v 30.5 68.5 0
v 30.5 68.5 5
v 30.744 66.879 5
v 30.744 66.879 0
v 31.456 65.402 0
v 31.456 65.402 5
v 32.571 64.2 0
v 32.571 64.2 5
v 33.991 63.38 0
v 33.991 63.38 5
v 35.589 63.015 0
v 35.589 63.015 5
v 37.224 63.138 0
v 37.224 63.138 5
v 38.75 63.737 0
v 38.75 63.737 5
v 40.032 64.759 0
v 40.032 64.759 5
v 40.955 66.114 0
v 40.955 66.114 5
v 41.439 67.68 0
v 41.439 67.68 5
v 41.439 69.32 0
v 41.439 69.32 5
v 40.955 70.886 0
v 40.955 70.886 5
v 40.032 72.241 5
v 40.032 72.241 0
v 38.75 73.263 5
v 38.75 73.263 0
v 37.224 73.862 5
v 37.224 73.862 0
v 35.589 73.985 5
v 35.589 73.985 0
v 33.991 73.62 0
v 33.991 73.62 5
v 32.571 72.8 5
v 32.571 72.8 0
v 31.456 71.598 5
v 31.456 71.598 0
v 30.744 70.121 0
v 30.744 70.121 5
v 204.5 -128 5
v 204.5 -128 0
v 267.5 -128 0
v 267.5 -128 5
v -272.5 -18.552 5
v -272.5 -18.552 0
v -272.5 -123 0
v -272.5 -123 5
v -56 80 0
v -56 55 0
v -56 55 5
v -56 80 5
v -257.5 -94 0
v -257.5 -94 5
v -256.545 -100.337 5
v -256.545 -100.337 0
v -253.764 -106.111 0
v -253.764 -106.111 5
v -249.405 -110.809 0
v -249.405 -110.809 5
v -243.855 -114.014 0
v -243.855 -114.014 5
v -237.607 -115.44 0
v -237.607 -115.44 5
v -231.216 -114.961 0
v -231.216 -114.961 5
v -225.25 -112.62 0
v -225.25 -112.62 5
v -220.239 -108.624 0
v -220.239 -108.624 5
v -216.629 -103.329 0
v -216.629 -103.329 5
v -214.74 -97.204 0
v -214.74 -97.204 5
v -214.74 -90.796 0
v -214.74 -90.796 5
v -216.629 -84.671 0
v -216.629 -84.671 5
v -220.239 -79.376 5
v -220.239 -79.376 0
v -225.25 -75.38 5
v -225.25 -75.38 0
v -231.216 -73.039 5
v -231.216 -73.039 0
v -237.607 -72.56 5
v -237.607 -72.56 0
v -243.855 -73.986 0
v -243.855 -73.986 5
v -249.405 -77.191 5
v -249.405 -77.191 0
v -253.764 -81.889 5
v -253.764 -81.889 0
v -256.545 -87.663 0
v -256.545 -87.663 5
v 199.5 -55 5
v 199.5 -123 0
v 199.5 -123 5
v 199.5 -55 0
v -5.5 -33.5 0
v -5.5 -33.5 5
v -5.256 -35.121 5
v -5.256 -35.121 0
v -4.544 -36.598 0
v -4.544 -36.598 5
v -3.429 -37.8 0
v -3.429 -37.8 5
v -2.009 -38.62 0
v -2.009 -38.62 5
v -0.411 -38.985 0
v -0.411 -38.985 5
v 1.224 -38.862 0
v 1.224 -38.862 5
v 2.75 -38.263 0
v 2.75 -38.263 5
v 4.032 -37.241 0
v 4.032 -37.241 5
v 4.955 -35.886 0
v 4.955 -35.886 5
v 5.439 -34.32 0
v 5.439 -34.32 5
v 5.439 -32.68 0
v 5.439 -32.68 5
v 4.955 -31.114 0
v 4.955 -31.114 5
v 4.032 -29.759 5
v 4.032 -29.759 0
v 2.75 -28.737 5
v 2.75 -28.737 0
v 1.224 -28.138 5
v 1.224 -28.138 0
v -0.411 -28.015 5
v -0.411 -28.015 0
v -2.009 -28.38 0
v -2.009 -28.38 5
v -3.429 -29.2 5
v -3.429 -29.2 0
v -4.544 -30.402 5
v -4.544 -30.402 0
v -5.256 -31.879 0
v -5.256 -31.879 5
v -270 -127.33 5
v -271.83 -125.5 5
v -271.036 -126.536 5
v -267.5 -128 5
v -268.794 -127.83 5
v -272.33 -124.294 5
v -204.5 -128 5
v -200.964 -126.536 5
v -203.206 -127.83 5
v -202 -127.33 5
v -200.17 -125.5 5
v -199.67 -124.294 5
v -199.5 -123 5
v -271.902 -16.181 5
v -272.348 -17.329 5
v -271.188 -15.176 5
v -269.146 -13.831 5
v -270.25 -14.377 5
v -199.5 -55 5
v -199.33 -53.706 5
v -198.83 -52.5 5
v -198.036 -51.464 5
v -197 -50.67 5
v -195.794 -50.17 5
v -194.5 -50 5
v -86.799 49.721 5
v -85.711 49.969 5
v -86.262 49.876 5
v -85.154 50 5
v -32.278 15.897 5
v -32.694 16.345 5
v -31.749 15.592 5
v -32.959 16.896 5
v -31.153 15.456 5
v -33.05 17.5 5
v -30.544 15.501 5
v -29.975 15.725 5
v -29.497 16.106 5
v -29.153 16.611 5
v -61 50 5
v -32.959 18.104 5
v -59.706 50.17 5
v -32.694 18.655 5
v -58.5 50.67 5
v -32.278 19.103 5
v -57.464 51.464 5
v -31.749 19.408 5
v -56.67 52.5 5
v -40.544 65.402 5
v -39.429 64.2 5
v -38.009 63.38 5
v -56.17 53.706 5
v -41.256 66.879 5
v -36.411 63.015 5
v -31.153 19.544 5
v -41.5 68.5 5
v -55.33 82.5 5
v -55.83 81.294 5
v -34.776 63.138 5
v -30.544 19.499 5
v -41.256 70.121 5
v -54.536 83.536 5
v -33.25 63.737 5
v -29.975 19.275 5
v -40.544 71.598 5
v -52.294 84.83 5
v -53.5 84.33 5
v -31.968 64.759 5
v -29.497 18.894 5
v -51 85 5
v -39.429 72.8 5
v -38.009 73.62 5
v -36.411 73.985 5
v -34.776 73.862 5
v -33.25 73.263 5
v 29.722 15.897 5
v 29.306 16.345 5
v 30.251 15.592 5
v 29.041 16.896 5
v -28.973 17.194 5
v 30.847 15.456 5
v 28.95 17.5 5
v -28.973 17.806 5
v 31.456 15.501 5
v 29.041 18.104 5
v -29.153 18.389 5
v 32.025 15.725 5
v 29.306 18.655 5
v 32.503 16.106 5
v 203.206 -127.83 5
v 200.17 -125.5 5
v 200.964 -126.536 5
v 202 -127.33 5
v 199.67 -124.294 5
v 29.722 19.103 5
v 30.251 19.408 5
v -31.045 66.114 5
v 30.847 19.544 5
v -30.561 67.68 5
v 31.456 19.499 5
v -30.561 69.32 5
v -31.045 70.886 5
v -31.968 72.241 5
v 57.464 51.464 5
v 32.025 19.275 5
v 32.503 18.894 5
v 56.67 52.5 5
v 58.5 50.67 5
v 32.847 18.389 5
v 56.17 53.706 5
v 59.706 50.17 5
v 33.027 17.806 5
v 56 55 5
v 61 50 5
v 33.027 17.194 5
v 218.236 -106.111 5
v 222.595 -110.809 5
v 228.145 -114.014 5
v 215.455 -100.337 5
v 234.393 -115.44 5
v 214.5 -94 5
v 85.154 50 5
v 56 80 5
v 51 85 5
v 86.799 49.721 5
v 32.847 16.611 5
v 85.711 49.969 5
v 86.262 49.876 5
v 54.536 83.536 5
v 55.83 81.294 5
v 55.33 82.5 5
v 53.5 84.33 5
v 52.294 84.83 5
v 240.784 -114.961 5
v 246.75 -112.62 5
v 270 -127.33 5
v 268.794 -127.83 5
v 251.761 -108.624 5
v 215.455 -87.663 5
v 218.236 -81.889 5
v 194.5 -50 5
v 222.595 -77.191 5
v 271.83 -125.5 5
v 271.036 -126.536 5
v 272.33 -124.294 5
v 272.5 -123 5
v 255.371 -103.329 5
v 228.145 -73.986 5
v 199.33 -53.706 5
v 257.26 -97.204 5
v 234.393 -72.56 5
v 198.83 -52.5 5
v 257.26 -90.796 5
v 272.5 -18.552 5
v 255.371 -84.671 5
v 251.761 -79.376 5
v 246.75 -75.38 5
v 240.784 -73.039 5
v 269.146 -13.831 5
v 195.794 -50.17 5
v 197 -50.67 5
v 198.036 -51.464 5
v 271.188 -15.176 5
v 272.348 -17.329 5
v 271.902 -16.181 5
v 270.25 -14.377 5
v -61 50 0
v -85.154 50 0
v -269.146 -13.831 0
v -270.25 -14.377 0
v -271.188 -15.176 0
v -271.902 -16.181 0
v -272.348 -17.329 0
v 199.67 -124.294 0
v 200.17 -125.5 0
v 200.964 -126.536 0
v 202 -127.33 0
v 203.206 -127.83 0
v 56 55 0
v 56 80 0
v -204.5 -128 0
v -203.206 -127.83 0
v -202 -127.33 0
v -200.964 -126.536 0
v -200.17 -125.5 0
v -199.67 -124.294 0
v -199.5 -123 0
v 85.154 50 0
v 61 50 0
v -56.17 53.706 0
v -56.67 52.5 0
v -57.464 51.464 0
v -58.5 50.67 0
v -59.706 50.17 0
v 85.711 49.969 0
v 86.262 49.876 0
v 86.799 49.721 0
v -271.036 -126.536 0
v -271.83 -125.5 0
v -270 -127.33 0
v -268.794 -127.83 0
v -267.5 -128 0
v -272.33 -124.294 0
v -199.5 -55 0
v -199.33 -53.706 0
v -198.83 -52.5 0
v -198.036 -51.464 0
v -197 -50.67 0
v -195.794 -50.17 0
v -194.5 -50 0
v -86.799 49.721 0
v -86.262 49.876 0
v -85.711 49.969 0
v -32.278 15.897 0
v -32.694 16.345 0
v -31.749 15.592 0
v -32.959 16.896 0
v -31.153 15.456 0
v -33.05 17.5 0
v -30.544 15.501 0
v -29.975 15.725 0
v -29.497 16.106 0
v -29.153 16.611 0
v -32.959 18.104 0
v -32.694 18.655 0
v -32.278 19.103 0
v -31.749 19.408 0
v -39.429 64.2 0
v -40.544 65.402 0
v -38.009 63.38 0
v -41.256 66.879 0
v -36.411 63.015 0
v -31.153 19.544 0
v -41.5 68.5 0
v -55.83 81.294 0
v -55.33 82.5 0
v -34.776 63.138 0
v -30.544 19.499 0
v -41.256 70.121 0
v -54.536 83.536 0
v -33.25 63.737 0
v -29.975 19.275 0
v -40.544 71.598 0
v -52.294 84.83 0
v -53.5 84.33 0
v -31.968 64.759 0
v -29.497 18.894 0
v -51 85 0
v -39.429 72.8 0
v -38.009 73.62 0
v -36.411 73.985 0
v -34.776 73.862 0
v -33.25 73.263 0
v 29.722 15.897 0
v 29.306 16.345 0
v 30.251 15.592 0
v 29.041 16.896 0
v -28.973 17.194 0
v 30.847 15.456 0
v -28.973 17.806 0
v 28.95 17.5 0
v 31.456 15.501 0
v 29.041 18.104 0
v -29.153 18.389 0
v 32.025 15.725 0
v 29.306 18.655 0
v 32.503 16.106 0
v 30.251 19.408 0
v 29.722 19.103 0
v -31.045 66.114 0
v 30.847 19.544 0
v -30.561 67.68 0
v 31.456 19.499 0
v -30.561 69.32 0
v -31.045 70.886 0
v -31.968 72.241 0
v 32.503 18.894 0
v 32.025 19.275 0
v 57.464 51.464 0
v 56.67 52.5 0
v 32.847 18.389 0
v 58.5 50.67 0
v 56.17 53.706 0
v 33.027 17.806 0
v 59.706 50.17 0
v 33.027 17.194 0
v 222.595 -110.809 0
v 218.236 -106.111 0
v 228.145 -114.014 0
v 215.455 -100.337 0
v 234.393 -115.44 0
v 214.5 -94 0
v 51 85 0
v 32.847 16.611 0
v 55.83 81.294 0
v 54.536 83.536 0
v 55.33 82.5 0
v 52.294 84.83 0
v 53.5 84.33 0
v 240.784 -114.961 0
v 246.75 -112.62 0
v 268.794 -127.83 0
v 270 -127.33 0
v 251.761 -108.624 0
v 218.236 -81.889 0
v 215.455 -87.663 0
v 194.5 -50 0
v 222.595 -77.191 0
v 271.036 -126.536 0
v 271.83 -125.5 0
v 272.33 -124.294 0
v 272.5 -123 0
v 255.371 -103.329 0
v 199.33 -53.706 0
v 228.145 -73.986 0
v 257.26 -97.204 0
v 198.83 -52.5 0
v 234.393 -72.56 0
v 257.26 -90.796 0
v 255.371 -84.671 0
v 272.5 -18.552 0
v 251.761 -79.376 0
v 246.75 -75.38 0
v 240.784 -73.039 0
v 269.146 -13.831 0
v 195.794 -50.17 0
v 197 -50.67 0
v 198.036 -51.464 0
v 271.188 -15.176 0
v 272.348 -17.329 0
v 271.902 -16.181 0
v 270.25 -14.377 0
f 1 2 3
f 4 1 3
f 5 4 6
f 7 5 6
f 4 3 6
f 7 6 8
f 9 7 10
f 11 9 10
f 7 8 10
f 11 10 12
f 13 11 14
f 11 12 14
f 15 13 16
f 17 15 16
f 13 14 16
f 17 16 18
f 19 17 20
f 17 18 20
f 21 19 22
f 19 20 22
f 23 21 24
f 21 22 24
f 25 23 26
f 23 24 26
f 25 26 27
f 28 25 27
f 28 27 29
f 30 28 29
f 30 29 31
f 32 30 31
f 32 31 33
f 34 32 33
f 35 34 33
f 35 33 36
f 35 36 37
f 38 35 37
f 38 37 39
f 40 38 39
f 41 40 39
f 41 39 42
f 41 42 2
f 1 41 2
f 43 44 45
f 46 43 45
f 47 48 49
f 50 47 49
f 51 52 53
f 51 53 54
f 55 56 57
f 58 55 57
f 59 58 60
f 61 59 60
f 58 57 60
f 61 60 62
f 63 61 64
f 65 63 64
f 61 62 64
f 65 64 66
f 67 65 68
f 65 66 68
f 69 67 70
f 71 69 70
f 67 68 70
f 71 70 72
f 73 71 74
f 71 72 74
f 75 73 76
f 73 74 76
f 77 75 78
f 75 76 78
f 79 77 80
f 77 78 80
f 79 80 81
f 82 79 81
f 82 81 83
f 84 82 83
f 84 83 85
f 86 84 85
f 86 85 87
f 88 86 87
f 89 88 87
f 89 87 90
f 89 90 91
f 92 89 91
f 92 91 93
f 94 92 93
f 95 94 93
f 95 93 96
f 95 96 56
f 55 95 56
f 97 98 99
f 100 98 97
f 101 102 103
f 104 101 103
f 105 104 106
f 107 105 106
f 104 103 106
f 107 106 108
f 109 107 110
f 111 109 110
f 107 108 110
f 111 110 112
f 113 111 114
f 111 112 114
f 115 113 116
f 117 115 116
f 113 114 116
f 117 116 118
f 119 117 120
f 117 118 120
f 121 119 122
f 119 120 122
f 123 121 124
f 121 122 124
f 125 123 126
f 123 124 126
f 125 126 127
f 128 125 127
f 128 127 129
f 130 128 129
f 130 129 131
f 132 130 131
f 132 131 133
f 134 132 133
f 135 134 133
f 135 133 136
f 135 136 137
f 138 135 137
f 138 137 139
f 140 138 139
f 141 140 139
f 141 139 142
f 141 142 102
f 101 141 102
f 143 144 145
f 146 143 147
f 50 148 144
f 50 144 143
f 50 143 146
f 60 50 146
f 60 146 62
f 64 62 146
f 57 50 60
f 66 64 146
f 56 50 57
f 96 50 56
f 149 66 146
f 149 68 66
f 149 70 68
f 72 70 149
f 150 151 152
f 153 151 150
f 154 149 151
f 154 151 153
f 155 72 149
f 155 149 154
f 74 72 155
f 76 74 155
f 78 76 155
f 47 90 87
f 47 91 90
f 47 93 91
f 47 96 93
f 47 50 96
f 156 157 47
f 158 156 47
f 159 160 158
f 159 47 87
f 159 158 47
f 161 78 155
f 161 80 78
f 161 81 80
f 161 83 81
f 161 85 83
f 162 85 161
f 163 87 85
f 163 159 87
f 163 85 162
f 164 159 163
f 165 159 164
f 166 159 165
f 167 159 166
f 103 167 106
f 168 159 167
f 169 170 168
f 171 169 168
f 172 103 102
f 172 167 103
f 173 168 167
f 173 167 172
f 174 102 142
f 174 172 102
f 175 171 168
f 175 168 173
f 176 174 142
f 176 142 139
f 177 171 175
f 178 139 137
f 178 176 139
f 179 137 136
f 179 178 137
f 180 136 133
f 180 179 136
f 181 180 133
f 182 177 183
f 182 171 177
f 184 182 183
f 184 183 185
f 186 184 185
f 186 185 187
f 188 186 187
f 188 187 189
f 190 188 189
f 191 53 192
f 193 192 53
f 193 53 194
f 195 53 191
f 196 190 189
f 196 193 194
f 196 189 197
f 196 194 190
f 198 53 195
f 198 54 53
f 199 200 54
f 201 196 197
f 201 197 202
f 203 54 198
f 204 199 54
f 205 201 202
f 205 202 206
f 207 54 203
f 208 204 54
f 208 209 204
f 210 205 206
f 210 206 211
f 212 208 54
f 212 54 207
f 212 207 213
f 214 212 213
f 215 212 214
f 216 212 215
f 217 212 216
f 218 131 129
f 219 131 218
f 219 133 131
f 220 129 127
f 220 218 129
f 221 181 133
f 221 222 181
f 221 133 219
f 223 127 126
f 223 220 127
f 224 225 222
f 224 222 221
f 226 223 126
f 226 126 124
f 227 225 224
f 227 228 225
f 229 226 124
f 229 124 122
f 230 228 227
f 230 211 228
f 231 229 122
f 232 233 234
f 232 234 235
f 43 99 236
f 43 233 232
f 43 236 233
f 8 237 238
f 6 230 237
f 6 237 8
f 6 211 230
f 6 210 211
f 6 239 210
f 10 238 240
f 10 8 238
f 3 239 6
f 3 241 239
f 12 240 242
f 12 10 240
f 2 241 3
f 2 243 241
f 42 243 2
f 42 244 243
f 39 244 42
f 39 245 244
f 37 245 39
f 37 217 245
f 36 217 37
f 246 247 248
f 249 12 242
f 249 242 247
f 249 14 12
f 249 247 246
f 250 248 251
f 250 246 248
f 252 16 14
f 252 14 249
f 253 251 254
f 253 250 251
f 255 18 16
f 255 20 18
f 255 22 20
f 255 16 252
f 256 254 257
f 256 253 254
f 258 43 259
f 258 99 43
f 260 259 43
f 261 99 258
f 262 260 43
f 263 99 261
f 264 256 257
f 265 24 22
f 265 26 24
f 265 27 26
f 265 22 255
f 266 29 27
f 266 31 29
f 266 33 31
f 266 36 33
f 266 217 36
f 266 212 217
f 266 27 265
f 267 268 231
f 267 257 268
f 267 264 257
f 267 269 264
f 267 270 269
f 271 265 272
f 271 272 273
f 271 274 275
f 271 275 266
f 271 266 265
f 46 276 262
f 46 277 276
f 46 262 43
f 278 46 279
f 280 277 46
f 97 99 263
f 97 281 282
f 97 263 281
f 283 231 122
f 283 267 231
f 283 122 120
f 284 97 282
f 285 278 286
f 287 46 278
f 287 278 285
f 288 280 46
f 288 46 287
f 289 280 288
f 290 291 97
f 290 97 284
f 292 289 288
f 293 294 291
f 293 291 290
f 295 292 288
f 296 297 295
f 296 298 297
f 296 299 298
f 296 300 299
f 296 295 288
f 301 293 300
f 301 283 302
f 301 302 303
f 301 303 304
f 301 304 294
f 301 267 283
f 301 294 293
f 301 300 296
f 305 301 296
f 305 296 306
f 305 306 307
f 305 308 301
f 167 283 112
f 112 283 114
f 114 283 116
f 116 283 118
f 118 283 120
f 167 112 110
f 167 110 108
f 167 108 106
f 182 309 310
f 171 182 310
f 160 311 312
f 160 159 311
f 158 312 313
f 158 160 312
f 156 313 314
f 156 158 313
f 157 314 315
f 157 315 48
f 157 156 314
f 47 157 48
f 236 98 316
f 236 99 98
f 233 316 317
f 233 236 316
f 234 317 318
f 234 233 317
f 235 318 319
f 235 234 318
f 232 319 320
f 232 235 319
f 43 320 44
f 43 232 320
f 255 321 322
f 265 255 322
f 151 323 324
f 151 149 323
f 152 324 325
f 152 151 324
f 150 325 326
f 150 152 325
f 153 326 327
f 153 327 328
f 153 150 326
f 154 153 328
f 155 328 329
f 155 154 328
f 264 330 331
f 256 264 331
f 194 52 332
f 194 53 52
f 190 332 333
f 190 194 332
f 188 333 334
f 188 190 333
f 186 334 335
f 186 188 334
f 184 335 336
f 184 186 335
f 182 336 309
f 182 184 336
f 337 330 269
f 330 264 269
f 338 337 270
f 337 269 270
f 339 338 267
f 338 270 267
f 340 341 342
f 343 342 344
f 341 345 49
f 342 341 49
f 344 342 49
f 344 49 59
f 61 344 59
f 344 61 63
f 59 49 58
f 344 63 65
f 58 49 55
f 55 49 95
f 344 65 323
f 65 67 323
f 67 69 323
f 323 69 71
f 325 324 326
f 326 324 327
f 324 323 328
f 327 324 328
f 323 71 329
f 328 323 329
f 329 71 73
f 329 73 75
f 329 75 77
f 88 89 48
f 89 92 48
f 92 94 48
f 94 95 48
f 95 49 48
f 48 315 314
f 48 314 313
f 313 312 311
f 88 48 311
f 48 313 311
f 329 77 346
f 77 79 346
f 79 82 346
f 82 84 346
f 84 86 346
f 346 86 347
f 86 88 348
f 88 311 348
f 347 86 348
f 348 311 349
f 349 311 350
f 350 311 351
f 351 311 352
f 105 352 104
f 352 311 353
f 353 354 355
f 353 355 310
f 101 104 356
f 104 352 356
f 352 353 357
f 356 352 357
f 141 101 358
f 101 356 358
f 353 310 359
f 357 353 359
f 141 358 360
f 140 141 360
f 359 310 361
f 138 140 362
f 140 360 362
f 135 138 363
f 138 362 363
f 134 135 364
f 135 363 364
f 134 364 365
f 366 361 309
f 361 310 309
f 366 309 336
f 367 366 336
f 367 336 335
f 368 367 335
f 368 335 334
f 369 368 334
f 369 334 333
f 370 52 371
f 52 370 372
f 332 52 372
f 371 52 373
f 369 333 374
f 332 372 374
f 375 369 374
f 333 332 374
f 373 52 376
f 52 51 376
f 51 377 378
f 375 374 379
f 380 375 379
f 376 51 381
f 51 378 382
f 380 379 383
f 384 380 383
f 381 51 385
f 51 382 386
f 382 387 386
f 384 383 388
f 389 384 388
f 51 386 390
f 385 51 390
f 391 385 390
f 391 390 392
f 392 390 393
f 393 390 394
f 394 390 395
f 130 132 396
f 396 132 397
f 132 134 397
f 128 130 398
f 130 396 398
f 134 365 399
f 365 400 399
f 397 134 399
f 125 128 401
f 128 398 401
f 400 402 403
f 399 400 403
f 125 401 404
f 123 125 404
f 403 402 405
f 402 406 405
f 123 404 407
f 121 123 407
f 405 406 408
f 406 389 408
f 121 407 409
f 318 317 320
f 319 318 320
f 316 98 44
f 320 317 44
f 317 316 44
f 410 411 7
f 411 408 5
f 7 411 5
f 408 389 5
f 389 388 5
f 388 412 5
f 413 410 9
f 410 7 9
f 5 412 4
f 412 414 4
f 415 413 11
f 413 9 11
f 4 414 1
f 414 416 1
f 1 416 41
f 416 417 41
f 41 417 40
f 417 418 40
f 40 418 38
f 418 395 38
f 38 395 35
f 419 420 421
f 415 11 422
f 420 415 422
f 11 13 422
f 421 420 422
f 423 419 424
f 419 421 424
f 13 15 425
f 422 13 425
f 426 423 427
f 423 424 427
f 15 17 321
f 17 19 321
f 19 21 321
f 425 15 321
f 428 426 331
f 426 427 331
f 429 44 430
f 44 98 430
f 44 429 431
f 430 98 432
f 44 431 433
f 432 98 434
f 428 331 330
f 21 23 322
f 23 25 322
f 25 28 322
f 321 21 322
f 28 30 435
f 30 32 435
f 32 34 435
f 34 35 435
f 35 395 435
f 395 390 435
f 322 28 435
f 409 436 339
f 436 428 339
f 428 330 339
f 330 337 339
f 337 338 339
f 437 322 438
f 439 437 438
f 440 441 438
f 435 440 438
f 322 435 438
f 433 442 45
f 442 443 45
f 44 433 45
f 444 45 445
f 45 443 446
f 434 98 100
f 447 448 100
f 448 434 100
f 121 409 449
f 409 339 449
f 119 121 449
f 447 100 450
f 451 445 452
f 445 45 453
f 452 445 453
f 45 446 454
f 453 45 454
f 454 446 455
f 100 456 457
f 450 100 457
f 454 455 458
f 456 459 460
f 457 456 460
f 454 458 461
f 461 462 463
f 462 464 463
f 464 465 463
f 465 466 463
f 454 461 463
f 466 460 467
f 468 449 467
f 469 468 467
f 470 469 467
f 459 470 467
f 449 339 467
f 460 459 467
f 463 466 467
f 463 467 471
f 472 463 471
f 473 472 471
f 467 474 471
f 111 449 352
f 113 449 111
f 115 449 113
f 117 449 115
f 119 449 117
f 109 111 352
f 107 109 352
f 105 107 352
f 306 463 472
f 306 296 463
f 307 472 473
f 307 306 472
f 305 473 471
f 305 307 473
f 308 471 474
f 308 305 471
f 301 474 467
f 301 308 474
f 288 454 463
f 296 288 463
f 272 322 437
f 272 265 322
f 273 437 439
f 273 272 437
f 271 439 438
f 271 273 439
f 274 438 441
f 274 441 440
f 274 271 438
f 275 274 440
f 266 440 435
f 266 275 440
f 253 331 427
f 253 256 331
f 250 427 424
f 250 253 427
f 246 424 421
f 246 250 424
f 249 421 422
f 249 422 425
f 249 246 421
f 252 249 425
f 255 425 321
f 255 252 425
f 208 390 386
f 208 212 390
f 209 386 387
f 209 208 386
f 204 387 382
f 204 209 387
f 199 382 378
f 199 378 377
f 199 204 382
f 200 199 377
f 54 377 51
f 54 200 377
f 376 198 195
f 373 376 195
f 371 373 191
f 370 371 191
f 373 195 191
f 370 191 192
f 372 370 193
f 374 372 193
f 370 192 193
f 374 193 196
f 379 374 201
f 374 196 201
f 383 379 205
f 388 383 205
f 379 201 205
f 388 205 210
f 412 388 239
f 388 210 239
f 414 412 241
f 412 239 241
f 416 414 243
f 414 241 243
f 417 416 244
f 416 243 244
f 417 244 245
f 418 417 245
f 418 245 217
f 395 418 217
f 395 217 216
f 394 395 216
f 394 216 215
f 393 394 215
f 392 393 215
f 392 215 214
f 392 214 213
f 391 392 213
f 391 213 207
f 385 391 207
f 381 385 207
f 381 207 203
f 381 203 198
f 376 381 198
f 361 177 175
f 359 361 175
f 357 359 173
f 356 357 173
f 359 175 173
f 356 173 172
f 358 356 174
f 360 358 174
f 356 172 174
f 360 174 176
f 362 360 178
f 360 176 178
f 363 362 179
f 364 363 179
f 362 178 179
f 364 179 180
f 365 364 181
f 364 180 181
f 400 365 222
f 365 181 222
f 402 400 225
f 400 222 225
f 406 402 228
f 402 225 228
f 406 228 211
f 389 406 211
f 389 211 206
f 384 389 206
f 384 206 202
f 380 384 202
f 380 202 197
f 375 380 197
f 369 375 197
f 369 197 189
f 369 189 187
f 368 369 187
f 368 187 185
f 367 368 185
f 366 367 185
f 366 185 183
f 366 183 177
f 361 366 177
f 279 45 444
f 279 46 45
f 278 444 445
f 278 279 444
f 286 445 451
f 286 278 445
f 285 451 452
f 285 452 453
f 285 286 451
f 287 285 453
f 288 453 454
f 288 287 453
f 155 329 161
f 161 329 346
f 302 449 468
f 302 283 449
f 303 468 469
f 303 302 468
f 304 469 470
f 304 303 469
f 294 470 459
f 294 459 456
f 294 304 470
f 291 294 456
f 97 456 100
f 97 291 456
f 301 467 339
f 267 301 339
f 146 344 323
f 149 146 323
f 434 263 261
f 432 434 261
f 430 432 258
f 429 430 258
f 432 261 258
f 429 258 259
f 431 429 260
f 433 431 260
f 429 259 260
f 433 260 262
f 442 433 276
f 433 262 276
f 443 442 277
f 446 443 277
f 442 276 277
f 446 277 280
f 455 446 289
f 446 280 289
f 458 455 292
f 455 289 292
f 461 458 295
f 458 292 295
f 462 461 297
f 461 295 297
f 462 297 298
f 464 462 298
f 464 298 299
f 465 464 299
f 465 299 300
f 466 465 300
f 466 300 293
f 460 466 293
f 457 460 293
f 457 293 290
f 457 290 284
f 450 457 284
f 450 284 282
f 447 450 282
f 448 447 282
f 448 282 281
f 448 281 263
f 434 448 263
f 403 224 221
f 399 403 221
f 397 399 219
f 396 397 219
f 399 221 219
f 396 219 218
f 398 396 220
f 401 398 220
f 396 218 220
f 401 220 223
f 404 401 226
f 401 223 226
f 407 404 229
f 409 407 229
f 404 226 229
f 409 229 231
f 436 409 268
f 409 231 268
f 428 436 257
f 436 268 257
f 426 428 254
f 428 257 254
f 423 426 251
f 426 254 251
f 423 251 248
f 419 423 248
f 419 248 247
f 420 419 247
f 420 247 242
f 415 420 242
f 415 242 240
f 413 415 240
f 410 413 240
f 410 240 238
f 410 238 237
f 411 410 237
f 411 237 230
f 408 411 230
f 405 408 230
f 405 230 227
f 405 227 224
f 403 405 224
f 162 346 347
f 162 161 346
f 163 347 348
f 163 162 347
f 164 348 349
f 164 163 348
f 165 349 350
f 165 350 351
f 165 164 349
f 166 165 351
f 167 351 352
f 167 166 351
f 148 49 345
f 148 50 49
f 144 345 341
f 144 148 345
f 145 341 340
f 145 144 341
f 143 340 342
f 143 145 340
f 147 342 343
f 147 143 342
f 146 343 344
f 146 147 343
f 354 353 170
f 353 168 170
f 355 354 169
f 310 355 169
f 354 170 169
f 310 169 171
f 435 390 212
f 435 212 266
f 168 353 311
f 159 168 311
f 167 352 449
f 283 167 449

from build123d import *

# Parameters (mm, degrees)
F0_W     = 73
F0_H     = 78
F0_W_2   = 112
F0_H_2   = 35
F1_DEPTH = 5
F2_R     = 5
F3_R     = 5
F6_D     = 4.1
F8_D     = 43
F9_D     = 11


with BuildPart() as f1:
    # F0 (on Top) → F1 (new body)
    with BuildSketch(Plane.XY):
        Polygon((-56, 50), (-86, 50), (-272.5, -15), (-272.5, -50), (-199.5, -50), (199.5, -50), (272.5, -50), (272.5, -15), (86, 50), (56, 50), align=None)
        with Locations((-236, -89)):
            Rectangle(F0_W, F0_H)
        with Locations((236, -89)):
            Rectangle(F0_W, F0_H)
        with Locations((0, 67.5)):
            Rectangle(F0_W_2, F0_H_2)
    extrude(amount=F1_DEPTH)

    # F2
    f2_edges = [f1.edges().sort_by_distance(p)[0] for p in [
        (-272.5, -128, 2.5),
        (-199.5, -128, 2.5),
        (199.5, -128, 2.5),
        (272.5, -128, 2.5),
        (272.5, -15, 2.5),
        (-272.5, -15, 2.5),
        (-199.5, -50, 2.5),
        (199.5, -50, 2.5),
        (-56, 50, 2.5),
        (-56, 85, 2.5),
        (56, 85, 2.5),
        (56, 50, 2.5),
    ]]
    fillet(f2_edges, radius=F2_R)

    # F3
    f3_edges = [f1.edges().sort_by_distance(p)[0] for p in [
        (86, 50, 2.5),
        (-86, 50, 2.5),
    ]]
    fillet(f3_edges, radius=F3_R)

    # F6 (through all)
    with Locations(Plane(origin=(0, 0, 0), x_dir=(1, 0, 0), z_dir=(0, 0, -1))):
        with Locations((-31, -17.5), (31, -17.5)):
            Hole(F6_D / 2)

    # F8 (through all)
    with Locations(Plane(origin=(0, 0, 0), x_dir=(1, 0, 0), z_dir=(0, 0, -1))):
        with Locations((-236, 94), (236, 94)):
            Hole(F8_D / 2)

    # F9 (through all)
    with Locations(Plane(origin=(0, 0, 0), x_dir=(1, 0, 0), z_dir=(0, 0, -1))):
        with Locations((-36, -68.5), (36, -68.5), (0, 33.5)):
            Hole(F9_D / 2)


solid = f1.part
